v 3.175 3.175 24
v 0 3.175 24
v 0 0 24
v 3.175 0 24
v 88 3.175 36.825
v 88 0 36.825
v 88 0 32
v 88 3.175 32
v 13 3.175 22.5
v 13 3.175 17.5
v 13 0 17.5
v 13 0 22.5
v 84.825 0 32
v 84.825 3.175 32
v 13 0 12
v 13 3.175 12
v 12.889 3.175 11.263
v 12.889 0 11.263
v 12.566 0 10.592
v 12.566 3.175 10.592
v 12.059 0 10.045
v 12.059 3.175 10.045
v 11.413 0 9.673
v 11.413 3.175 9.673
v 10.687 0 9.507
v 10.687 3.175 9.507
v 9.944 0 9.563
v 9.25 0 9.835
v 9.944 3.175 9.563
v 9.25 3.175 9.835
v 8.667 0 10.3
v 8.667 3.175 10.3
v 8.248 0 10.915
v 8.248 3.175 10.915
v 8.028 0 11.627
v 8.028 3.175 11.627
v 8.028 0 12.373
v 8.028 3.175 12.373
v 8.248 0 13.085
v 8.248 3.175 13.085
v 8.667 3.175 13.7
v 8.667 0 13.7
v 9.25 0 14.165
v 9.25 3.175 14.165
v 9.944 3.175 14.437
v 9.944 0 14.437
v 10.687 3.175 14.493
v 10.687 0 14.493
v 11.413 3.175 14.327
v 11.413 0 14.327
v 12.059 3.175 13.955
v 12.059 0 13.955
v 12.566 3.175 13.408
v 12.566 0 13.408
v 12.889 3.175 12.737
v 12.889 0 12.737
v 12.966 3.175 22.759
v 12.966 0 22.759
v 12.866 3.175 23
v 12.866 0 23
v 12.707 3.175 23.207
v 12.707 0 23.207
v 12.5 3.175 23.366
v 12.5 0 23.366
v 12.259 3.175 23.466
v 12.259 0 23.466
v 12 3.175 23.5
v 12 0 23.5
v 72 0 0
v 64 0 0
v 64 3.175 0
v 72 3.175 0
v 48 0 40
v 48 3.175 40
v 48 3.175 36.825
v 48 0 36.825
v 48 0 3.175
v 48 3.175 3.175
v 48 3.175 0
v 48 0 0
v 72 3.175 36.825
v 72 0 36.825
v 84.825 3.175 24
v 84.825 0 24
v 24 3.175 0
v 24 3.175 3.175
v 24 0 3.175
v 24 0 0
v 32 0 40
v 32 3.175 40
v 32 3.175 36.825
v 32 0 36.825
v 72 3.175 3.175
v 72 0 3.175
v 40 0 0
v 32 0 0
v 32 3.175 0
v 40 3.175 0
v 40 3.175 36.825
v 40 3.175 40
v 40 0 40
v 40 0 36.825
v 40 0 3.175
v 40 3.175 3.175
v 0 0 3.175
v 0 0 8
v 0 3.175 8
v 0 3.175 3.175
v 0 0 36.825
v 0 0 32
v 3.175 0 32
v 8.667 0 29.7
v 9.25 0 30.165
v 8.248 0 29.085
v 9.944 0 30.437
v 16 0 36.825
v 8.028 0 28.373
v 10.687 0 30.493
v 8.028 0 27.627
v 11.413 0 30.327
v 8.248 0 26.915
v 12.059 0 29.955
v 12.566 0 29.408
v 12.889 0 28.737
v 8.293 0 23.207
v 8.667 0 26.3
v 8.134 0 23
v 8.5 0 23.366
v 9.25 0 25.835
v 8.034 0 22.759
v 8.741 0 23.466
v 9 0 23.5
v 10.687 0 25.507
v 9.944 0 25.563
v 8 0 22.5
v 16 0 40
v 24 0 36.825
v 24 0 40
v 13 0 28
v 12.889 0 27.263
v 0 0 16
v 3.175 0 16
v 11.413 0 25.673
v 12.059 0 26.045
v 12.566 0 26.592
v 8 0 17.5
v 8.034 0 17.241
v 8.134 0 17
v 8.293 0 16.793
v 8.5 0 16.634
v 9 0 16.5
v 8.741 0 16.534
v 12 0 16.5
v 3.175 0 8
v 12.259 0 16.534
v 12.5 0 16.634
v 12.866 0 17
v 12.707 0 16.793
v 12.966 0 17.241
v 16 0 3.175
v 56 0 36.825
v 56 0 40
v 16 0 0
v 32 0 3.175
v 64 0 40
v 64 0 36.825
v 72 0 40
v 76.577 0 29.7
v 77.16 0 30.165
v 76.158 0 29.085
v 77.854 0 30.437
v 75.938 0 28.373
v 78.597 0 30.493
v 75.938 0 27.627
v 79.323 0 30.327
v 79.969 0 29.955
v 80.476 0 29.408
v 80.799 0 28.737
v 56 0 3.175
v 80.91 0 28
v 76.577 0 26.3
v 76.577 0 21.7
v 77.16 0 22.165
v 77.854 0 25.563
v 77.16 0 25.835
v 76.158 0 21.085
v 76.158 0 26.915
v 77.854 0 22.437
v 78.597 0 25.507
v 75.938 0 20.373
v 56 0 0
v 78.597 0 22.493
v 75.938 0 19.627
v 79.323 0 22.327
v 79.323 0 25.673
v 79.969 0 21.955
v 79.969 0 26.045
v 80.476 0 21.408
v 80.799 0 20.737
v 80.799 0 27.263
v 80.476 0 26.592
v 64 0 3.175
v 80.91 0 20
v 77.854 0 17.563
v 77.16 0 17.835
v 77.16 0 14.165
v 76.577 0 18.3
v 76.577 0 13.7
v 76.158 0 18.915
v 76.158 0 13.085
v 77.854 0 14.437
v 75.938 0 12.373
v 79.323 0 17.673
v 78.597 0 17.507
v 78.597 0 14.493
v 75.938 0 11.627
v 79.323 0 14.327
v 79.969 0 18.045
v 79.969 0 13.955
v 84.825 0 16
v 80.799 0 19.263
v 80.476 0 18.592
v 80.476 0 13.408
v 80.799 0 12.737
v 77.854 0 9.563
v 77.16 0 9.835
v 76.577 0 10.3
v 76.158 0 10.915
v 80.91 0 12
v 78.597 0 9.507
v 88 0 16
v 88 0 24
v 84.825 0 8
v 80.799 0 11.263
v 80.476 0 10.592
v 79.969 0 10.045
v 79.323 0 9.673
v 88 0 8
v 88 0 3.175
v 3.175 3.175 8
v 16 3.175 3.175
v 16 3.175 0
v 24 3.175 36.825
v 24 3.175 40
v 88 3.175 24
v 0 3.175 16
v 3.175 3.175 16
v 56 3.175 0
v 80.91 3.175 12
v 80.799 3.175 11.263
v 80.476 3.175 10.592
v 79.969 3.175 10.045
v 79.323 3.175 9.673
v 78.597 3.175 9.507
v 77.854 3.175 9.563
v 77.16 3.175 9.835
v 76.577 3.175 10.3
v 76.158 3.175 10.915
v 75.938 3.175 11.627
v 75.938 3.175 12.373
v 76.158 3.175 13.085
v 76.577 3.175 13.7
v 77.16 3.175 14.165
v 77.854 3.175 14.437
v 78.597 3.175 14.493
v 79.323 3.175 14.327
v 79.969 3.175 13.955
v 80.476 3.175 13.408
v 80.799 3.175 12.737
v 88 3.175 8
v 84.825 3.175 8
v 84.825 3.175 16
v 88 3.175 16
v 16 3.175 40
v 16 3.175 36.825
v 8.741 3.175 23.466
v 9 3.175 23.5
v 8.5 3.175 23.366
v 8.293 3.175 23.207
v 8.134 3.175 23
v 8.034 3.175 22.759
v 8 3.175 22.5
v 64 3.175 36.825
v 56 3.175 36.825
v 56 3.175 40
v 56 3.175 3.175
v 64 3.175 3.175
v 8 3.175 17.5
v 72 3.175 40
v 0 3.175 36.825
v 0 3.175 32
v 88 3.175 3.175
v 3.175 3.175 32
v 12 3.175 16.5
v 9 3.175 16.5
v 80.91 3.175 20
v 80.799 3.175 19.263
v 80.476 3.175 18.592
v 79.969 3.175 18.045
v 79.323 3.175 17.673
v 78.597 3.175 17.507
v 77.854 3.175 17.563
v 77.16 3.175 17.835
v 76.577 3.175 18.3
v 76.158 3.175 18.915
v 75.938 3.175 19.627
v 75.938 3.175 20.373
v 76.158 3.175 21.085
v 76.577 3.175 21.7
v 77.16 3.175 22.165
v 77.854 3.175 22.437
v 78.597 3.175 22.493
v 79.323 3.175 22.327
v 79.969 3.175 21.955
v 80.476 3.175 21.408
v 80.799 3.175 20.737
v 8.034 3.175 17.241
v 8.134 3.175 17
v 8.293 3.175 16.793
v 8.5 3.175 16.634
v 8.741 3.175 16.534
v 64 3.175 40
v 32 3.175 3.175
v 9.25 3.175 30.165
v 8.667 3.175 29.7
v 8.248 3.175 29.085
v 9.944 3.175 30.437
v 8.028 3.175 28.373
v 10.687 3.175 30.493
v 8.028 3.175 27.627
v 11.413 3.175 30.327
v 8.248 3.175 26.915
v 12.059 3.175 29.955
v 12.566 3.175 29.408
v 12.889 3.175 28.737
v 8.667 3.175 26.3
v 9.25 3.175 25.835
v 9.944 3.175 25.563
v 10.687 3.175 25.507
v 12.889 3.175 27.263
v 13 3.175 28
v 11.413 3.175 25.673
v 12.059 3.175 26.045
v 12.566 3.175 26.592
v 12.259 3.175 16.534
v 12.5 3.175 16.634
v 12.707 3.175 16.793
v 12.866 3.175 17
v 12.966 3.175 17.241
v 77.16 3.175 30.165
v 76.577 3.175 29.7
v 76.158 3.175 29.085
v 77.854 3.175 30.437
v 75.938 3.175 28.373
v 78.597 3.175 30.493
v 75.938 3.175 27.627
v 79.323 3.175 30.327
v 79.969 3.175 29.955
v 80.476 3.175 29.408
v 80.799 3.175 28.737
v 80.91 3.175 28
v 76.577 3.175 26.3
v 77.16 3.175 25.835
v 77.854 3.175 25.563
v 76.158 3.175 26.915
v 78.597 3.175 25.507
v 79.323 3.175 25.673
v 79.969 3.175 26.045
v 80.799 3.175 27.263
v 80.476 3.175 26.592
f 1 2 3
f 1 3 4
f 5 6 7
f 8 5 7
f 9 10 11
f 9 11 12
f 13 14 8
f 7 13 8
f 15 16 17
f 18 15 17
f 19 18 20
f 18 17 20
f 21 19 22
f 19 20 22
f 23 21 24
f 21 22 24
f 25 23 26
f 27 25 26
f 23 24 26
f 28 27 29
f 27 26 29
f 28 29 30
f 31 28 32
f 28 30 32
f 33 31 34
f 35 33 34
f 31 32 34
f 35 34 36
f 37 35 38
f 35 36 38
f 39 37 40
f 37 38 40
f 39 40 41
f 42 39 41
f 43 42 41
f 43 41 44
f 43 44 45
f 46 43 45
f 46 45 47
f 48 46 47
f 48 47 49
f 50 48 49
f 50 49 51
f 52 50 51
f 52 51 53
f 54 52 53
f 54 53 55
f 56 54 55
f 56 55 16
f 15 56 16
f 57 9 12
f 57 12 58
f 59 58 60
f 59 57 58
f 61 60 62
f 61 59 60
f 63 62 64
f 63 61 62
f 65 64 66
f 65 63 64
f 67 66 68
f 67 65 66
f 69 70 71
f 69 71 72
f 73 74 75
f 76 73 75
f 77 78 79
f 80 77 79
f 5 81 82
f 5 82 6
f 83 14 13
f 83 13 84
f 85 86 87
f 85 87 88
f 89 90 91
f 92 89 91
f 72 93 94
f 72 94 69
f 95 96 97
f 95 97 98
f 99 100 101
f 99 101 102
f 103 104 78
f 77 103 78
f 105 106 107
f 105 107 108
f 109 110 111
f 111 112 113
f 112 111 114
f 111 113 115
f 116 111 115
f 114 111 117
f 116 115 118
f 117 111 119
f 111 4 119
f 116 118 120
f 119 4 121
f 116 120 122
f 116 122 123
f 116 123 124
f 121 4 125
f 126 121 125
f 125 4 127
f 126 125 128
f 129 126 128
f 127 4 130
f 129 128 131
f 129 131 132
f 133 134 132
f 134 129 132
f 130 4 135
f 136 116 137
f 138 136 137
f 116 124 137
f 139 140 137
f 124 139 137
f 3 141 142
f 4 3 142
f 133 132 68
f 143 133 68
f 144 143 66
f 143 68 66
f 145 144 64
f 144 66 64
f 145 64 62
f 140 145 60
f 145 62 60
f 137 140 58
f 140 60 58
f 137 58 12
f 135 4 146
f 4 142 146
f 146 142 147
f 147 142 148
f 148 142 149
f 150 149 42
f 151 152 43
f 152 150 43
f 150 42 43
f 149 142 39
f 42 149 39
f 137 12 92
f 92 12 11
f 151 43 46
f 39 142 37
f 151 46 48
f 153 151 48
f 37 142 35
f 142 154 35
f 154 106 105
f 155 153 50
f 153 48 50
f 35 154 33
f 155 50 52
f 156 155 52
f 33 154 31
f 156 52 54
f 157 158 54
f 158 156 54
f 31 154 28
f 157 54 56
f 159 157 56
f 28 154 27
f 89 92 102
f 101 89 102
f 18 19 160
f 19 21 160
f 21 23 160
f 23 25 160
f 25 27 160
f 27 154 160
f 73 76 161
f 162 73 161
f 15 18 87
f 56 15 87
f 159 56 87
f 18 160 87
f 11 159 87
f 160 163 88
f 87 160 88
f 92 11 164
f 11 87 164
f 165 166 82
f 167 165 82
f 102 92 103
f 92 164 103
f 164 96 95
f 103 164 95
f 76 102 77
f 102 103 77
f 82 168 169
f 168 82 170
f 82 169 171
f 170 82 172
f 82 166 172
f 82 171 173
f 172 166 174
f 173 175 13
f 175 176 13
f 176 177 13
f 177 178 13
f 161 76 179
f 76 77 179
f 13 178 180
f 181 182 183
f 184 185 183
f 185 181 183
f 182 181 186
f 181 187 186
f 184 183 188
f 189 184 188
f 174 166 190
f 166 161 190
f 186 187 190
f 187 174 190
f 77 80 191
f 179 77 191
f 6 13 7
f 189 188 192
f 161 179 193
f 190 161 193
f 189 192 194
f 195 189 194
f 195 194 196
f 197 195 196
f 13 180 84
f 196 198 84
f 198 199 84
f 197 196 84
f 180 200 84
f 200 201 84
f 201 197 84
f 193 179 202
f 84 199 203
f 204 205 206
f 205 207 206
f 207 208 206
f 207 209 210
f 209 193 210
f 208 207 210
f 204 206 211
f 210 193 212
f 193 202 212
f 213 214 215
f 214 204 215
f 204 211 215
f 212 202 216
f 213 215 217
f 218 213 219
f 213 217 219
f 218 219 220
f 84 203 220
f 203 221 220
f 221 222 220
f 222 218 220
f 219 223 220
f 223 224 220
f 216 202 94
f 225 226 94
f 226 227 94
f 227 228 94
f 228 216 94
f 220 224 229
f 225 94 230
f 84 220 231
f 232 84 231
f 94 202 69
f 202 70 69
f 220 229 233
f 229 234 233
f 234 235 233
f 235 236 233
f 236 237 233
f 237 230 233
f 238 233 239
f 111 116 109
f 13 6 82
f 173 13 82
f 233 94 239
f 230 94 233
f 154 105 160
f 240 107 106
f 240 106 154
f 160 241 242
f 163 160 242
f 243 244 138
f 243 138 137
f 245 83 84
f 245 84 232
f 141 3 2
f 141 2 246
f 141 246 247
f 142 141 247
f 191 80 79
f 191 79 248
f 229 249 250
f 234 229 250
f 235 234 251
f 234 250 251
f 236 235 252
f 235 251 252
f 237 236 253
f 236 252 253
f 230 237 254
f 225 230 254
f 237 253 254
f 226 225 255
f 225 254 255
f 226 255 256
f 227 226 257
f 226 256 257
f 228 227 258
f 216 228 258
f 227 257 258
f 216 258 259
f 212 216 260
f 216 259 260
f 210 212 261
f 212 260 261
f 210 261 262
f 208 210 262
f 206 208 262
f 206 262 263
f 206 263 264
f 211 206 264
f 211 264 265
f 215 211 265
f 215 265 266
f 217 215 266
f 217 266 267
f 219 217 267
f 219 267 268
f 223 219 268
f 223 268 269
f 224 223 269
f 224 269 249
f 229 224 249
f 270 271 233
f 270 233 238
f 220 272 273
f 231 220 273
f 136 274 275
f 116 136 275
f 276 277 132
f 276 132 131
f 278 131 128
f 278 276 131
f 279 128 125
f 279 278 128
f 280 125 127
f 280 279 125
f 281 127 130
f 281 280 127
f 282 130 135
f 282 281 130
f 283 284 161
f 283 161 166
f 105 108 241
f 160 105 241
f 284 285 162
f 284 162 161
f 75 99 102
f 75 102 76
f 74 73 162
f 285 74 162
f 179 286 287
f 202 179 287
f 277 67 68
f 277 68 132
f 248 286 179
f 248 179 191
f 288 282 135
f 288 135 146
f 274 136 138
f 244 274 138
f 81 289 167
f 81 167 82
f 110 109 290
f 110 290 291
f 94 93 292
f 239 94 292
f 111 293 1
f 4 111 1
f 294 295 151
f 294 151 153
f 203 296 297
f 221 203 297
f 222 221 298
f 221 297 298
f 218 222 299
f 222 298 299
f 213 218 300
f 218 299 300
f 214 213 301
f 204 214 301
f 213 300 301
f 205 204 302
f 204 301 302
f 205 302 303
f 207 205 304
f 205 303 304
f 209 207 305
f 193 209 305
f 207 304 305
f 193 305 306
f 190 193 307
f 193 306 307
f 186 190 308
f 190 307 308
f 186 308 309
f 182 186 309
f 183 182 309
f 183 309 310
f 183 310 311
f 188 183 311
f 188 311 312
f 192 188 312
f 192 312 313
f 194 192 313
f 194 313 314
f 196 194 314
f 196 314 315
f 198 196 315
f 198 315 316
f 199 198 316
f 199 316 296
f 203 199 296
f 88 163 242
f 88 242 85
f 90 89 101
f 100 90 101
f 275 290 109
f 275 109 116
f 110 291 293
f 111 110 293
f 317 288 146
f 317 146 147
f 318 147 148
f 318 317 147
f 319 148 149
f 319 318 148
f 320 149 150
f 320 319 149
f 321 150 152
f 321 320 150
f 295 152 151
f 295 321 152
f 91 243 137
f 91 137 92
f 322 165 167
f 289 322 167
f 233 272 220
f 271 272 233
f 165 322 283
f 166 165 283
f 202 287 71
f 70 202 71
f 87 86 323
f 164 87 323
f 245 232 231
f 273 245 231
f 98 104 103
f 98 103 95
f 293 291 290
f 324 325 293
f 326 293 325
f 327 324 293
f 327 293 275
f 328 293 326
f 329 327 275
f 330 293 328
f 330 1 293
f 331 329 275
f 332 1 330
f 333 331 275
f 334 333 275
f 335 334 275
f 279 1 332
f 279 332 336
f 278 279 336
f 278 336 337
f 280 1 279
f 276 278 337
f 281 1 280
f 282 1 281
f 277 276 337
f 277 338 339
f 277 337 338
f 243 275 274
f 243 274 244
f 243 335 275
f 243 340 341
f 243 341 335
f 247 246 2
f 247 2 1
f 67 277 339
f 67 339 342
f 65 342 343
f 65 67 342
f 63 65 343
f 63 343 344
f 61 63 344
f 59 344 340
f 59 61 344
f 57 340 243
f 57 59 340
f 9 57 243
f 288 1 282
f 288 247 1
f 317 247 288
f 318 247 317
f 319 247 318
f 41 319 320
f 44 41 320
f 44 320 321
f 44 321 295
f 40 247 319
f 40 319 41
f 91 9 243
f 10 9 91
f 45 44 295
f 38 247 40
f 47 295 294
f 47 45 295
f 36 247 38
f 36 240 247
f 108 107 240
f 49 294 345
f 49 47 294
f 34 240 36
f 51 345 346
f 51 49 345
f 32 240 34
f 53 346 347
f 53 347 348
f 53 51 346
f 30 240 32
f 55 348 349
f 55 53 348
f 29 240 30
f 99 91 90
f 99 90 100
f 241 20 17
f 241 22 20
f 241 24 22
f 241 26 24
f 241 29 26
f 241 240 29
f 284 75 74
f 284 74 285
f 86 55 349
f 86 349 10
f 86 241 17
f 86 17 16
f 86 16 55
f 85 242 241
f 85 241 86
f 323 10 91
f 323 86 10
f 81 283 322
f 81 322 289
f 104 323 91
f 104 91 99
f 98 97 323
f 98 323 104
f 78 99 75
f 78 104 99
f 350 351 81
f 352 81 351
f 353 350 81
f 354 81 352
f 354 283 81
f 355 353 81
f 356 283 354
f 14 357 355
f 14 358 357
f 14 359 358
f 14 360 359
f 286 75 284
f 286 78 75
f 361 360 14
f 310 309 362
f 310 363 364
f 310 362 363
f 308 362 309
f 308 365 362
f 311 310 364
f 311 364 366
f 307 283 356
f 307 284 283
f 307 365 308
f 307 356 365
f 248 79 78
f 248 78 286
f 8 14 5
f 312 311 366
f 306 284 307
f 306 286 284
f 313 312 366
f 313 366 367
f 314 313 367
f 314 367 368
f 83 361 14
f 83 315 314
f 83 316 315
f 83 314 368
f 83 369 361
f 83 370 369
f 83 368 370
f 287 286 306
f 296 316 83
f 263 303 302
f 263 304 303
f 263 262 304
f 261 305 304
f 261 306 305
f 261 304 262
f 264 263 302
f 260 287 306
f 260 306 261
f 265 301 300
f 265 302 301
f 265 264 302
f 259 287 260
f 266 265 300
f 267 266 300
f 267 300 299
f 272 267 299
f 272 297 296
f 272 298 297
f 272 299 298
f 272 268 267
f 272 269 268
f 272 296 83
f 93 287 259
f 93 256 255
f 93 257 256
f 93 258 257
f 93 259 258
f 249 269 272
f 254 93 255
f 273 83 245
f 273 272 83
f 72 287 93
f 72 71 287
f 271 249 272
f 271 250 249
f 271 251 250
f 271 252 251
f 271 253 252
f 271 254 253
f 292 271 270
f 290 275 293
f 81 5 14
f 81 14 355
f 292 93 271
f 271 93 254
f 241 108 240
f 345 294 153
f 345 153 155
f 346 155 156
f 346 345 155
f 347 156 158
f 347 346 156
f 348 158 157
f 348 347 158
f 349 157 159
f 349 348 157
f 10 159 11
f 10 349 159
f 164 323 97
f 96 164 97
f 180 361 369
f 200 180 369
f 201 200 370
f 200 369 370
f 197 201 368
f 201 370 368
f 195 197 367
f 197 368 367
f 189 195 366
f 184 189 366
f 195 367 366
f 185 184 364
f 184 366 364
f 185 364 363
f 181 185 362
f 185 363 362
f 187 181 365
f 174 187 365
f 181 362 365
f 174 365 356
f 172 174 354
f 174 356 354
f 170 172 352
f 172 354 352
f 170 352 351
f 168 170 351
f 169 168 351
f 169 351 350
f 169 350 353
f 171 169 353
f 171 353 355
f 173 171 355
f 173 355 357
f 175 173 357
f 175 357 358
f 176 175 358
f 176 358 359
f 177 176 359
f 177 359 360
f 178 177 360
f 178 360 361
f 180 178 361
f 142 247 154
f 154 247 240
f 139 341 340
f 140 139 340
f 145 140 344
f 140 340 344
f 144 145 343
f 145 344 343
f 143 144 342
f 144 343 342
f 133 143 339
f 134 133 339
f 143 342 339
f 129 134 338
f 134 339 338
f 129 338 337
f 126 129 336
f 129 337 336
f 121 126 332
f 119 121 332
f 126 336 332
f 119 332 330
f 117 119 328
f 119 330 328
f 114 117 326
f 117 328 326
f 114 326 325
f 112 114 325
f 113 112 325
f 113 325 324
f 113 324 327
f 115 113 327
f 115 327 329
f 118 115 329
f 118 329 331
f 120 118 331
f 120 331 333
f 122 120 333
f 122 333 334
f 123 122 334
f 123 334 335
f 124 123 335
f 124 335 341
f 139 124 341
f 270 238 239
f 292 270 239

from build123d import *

# Parameters (mm, degrees)
SKETCH1_W           = 88
SKETCH1_H           = 40
BOSS_EXTRUDE1_DEPTH = 3.175
CUT_EXTRUDE1_REACH  = 5.175
SKETCH2_W           = 16
SKETCH2_H           = 3.175
SKETCH2_W_2         = 8
CUT_EXTRUDE2_REACH  = 5.175
SKETCH3_W           = 3.175
SKETCH3_H           = 8
CUT_EXTRUDE3_REACH  = 5.175
SKETCH4_R           = 2.5
CUT_EXTRUDE4_REACH  = 5.175
SKETCH5_R           = 2.5


with BuildPart() as part:
    # Sketch1 → Boss-Extrude1 (new body)
    with BuildSketch(Plane(origin=(0, 0, 0), x_dir=(1, 0, 0), z_dir=(0, 1, 0))):
        with Locations((44, -20)):
            Rectangle(SKETCH1_W, SKETCH1_H)
    extrude(amount=BOSS_EXTRUDE1_DEPTH)

    # Sketch2 → Cut-Extrude1 (cut, up to next)
    with BuildSketch(Plane(origin=(0, 3.175, 0), x_dir=(1, 0, 0), z_dir=(0, 1, 0)), mode=Mode.PRIVATE) as cut_extrude1_sk1:
        with Locations((8, -1.5875)):
            Rectangle(SKETCH2_W, SKETCH2_H)
    cut_extrude1_tool1 = extrude(cut_extrude1_sk1.sketch, amount=-CUT_EXTRUDE1_REACH, mode=Mode.PRIVATE) & part.part
    add(cut_extrude1_tool1.solids().sort_by_distance((8, 3.175, 1.5875))[0], mode=Mode.SUBTRACT)
    # Sketch2 → Cut-Extrude1 (cut, up to next)
    with BuildSketch(Plane(origin=(0, 3.175, 0), x_dir=(1, 0, 0), z_dir=(0, 1, 0)), mode=Mode.PRIVATE) as cut_extrude1_sk2:
        with Locations((44, -1.5875)):
            Rectangle(SKETCH2_W_2, SKETCH2_H)
    cut_extrude1_tool2 = extrude(cut_extrude1_sk2.sketch, amount=-CUT_EXTRUDE1_REACH, mode=Mode.PRIVATE) & part.part
    add(cut_extrude1_tool2.solids().sort_by_distance((44, 3.175, 1.5875))[0], mode=Mode.SUBTRACT)
    # Sketch2 → Cut-Extrude1 (cut, up to next)
    with BuildSketch(Plane(origin=(0, 3.175, 0), x_dir=(1, 0, 0), z_dir=(0, 1, 0)), mode=Mode.PRIVATE) as cut_extrude1_sk3:
        with Locations((60, -1.5875)):
            Rectangle(SKETCH2_W_2, SKETCH2_H)
    cut_extrude1_tool3 = extrude(cut_extrude1_sk3.sketch, amount=-CUT_EXTRUDE1_REACH, mode=Mode.PRIVATE) & part.part
    add(cut_extrude1_tool3.solids().sort_by_distance((60, 3.175, 1.5875))[0], mode=Mode.SUBTRACT)
    # Sketch2 → Cut-Extrude1 (cut, up to next)
    with BuildSketch(Plane(origin=(0, 3.175, 0), x_dir=(1, 0, 0), z_dir=(0, 1, 0)), mode=Mode.PRIVATE) as cut_extrude1_sk4:
        with Locations((80, -1.5875)):
            Rectangle(SKETCH2_W, SKETCH2_H)
    cut_extrude1_tool4 = extrude(cut_extrude1_sk4.sketch, amount=-CUT_EXTRUDE1_REACH, mode=Mode.PRIVATE) & part.part
    add(cut_extrude1_tool4.solids().sort_by_distance((80, 3.175, 1.5875))[0], mode=Mode.SUBTRACT)
    # Sketch2 → Cut-Extrude1 (cut, up to next)
    with BuildSketch(Plane(origin=(0, 3.175, 0), x_dir=(1, 0, 0), z_dir=(0, 1, 0)), mode=Mode.PRIVATE) as cut_extrude1_sk5:
        with Locations((28, -1.5875)):
            Rectangle(SKETCH2_W_2, SKETCH2_H)
    cut_extrude1_tool5 = extrude(cut_extrude1_sk5.sketch, amount=-CUT_EXTRUDE1_REACH, mode=Mode.PRIVATE) & part.part
    add(cut_extrude1_tool5.solids().sort_by_distance((28, 3.175, 1.5875))[0], mode=Mode.SUBTRACT)
    # Sketch2 → Cut-Extrude1 (cut, up to next)
    with BuildSketch(Plane(origin=(0, 3.175, 0), x_dir=(1, 0, 0), z_dir=(0, 1, 0)), mode=Mode.PRIVATE) as cut_extrude1_sk6:
        with Locations((44, -38.4125)):
            Rectangle(SKETCH2_W_2, SKETCH2_H)
    cut_extrude1_tool6 = extrude(cut_extrude1_sk6.sketch, amount=-CUT_EXTRUDE1_REACH, mode=Mode.PRIVATE) & part.part
    add(cut_extrude1_tool6.solids().sort_by_distance((44, 3.175, 38.4125))[0], mode=Mode.SUBTRACT)
    # Sketch2 → Cut-Extrude1 (cut, up to next)
    with BuildSketch(Plane(origin=(0, 3.175, 0), x_dir=(1, 0, 0), z_dir=(0, 1, 0)), mode=Mode.PRIVATE) as cut_extrude1_sk7:
        with Locations((28, -38.4125)):
            Rectangle(SKETCH2_W_2, SKETCH2_H)
    cut_extrude1_tool7 = extrude(cut_extrude1_sk7.sketch, amount=-CUT_EXTRUDE1_REACH, mode=Mode.PRIVATE) & part.part
    add(cut_extrude1_tool7.solids().sort_by_distance((28, 3.175, 38.4125))[0], mode=Mode.SUBTRACT)
    # Sketch2 → Cut-Extrude1 (cut, up to next)
    with BuildSketch(Plane(origin=(0, 3.175, 0), x_dir=(1, 0, 0), z_dir=(0, 1, 0)), mode=Mode.PRIVATE) as cut_extrude1_sk8:
        with Locations((8, -38.4125)):
            Rectangle(SKETCH2_W, SKETCH2_H)
    cut_extrude1_tool8 = extrude(cut_extrude1_sk8.sketch, amount=-CUT_EXTRUDE1_REACH, mode=Mode.PRIVATE) & part.part
    add(cut_extrude1_tool8.solids().sort_by_distance((8, 3.175, 38.4125))[0], mode=Mode.SUBTRACT)
    # Sketch2 → Cut-Extrude1 (cut, up to next)
    with BuildSketch(Plane(origin=(0, 3.175, 0), x_dir=(1, 0, 0), z_dir=(0, 1, 0)), mode=Mode.PRIVATE) as cut_extrude1_sk9:
        with Locations((80, -38.4125)):
            Rectangle(SKETCH2_W, SKETCH2_H)
    cut_extrude1_tool9 = extrude(cut_extrude1_sk9.sketch, amount=-CUT_EXTRUDE1_REACH, mode=Mode.PRIVATE) & part.part
    add(cut_extrude1_tool9.solids().sort_by_distance((80, 3.175, 38.4125))[0], mode=Mode.SUBTRACT)
    # Sketch2 → Cut-Extrude1 (cut, up to next)
    with BuildSketch(Plane(origin=(0, 3.175, 0), x_dir=(1, 0, 0), z_dir=(0, 1, 0)), mode=Mode.PRIVATE) as cut_extrude1_sk10:
        with Locations((60, -38.4125)):
            Rectangle(SKETCH2_W_2, SKETCH2_H)
    cut_extrude1_tool10 = extrude(cut_extrude1_sk10.sketch, amount=-CUT_EXTRUDE1_REACH, mode=Mode.PRIVATE) & part.part
    add(cut_extrude1_tool10.solids().sort_by_distance((60, 3.175, 38.4125))[0], mode=Mode.SUBTRACT)

    # Sketch3 → Cut-Extrude2 (cut, up to next)
    with BuildSketch(Plane(origin=(0, 3.175, 0), x_dir=(1, 0, 0), z_dir=(0, 1, 0)), mode=Mode.PRIVATE) as cut_extrude2_sk1:
        with Locations((1.5875, -28)):
            Rectangle(SKETCH3_W, SKETCH3_H)
    cut_extrude2_tool1 = extrude(cut_extrude2_sk1.sketch, amount=-CUT_EXTRUDE2_REACH, mode=Mode.PRIVATE) & part.part
    add(cut_extrude2_tool1.solids().sort_by_distance((1.5875, 3.175, 28))[0], mode=Mode.SUBTRACT)
    # Sketch3 → Cut-Extrude2 (cut, up to next)
    with BuildSketch(Plane(origin=(0, 3.175, 0), x_dir=(1, 0, 0), z_dir=(0, 1, 0)), mode=Mode.PRIVATE) as cut_extrude2_sk2:
        with Locations((1.5875, -12)):
            Rectangle(SKETCH3_W, SKETCH3_H)
    cut_extrude2_tool2 = extrude(cut_extrude2_sk2.sketch, amount=-CUT_EXTRUDE2_REACH, mode=Mode.PRIVATE) & part.part
    add(cut_extrude2_tool2.solids().sort_by_distance((1.5875, 3.175, 12))[0], mode=Mode.SUBTRACT)
    # Sketch3 → Cut-Extrude2 (cut, up to next)
    with BuildSketch(Plane(origin=(0, 3.175, 0), x_dir=(1, 0, 0), z_dir=(0, 1, 0)), mode=Mode.PRIVATE) as cut_extrude2_sk3:
        with Locations((86.4125, -28)):
            Rectangle(SKETCH3_W, SKETCH3_H)
    cut_extrude2_tool3 = extrude(cut_extrude2_sk3.sketch, amount=-CUT_EXTRUDE2_REACH, mode=Mode.PRIVATE) & part.part
    add(cut_extrude2_tool3.solids().sort_by_distance((86.4125, 3.175, 28))[0], mode=Mode.SUBTRACT)
    # Sketch3 → Cut-Extrude2 (cut, up to next)
    with BuildSketch(Plane(origin=(0, 3.175, 0), x_dir=(1, 0, 0), z_dir=(0, 1, 0)), mode=Mode.PRIVATE) as cut_extrude2_sk4:
        with Locations((86.4125, -12)):
            Rectangle(SKETCH3_W, SKETCH3_H)
    cut_extrude2_tool4 = extrude(cut_extrude2_sk4.sketch, amount=-CUT_EXTRUDE2_REACH, mode=Mode.PRIVATE) & part.part
    add(cut_extrude2_tool4.solids().sort_by_distance((86.4125, 3.175, 12))[0], mode=Mode.SUBTRACT)

    # Sketch4 → Cut-Extrude3 (cut, up to next)
    with BuildSketch(Plane(origin=(0, 3.175, 0), x_dir=(1, 0, 0), z_dir=(0, 1, 0)), mode=Mode.PRIVATE) as cut_extrude3_sk1:
        with Locations((78.41, -28)):
            Circle(SKETCH4_R)
    cut_extrude3_tool1 = extrude(cut_extrude3_sk1.sketch, amount=-CUT_EXTRUDE3_REACH, mode=Mode.PRIVATE) & part.part
    add(cut_extrude3_tool1.solids().sort_by_distance((78.41, 3.175, 28))[0], mode=Mode.SUBTRACT)
    # Sketch4 → Cut-Extrude3 (cut, up to next)
    with BuildSketch(Plane(origin=(0, 3.175, 0), x_dir=(1, 0, 0), z_dir=(0, 1, 0)), mode=Mode.PRIVATE) as cut_extrude3_sk2:
        with Locations((78.41, -12)):
            Circle(SKETCH4_R)
    cut_extrude3_tool2 = extrude(cut_extrude3_sk2.sketch, amount=-CUT_EXTRUDE3_REACH, mode=Mode.PRIVATE) & part.part
    add(cut_extrude3_tool2.solids().sort_by_distance((78.41, 3.175, 12))[0], mode=Mode.SUBTRACT)
    # Sketch4 → Cut-Extrude3 (cut, up to next)
    with BuildSketch(Plane(origin=(0, 3.175, 0), x_dir=(1, 0, 0), z_dir=(0, 1, 0)), mode=Mode.PRIVATE) as cut_extrude3_sk3:
        with Locations((78.41, -20)):
            Circle(SKETCH4_R)
    cut_extrude3_tool3 = extrude(cut_extrude3_sk3.sketch, amount=-CUT_EXTRUDE3_REACH, mode=Mode.PRIVATE) & part.part
    add(cut_extrude3_tool3.solids().sort_by_distance((78.41, 3.175, 20))[0], mode=Mode.SUBTRACT)

    # Sketch5 → Cut-Extrude4 (cut, up to next)
    with BuildSketch(Plane(origin=(0, 3.175, 0), x_dir=(1, 0, 0), z_dir=(0, 1, 0)), mode=Mode.PRIVATE) as cut_extrude4_sk1:
        with Locations((10.5, -12)):
            Circle(SKETCH5_R)
    cut_extrude4_tool1 = extrude(cut_extrude4_sk1.sketch, amount=-CUT_EXTRUDE4_REACH, mode=Mode.PRIVATE) & part.part
    add(cut_extrude4_tool1.solids().sort_by_distance((10.5, 3.175, 12))[0], mode=Mode.SUBTRACT)
    # Sketch5 → Cut-Extrude4 (cut, up to next)
    with BuildSketch(Plane(origin=(0, 3.175, 0), x_dir=(1, 0, 0), z_dir=(0, 1, 0)), mode=Mode.PRIVATE) as cut_extrude4_sk2:
        with Locations((10.5, -28)):
            Circle(SKETCH5_R)
    cut_extrude4_tool2 = extrude(cut_extrude4_sk2.sketch, amount=-CUT_EXTRUDE4_REACH, mode=Mode.PRIVATE) & part.part
    add(cut_extrude4_tool2.solids().sort_by_distance((10.5, 3.175, 28))[0], mode=Mode.SUBTRACT)
    # Sketch5 → Cut-Extrude4 (cut, up to next)
    with BuildSketch(Plane(origin=(0, 3.175, 0), x_dir=(1, 0, 0), z_dir=(0, 1, 0)), mode=Mode.PRIVATE) as cut_extrude4_sk3:
        with BuildLine():
            Line((9, -16.5), (12, -16.5))
            ThreePointArc((12, -16.5), (12.707106781, -16.792893219), (13, -17.5))
            Line((13, -17.5), (13, -22.5))
            ThreePointArc((13, -22.5), (12.707106781, -23.207106781), (12, -23.5))
            Line((12, -23.5), (9, -23.5))
            ThreePointArc((9, -23.5), (8.292893219, -23.207106781), (8, -22.5))
            Line((8, -22.5), (8, -17.5))
            ThreePointArc((8, -17.5), (8.292893219, -16.792893219), (9, -16.5))
        make_face()
    cut_extrude4_tool3 = extrude(cut_extrude4_sk3.sketch, amount=-CUT_EXTRUDE4_REACH, mode=Mode.PRIVATE) & part.part
    add(cut_extrude4_tool3.solids().sort_by_distance((10.5, 3.175, 20))[0], mode=Mode.SUBTRACT)


solid = part.part
